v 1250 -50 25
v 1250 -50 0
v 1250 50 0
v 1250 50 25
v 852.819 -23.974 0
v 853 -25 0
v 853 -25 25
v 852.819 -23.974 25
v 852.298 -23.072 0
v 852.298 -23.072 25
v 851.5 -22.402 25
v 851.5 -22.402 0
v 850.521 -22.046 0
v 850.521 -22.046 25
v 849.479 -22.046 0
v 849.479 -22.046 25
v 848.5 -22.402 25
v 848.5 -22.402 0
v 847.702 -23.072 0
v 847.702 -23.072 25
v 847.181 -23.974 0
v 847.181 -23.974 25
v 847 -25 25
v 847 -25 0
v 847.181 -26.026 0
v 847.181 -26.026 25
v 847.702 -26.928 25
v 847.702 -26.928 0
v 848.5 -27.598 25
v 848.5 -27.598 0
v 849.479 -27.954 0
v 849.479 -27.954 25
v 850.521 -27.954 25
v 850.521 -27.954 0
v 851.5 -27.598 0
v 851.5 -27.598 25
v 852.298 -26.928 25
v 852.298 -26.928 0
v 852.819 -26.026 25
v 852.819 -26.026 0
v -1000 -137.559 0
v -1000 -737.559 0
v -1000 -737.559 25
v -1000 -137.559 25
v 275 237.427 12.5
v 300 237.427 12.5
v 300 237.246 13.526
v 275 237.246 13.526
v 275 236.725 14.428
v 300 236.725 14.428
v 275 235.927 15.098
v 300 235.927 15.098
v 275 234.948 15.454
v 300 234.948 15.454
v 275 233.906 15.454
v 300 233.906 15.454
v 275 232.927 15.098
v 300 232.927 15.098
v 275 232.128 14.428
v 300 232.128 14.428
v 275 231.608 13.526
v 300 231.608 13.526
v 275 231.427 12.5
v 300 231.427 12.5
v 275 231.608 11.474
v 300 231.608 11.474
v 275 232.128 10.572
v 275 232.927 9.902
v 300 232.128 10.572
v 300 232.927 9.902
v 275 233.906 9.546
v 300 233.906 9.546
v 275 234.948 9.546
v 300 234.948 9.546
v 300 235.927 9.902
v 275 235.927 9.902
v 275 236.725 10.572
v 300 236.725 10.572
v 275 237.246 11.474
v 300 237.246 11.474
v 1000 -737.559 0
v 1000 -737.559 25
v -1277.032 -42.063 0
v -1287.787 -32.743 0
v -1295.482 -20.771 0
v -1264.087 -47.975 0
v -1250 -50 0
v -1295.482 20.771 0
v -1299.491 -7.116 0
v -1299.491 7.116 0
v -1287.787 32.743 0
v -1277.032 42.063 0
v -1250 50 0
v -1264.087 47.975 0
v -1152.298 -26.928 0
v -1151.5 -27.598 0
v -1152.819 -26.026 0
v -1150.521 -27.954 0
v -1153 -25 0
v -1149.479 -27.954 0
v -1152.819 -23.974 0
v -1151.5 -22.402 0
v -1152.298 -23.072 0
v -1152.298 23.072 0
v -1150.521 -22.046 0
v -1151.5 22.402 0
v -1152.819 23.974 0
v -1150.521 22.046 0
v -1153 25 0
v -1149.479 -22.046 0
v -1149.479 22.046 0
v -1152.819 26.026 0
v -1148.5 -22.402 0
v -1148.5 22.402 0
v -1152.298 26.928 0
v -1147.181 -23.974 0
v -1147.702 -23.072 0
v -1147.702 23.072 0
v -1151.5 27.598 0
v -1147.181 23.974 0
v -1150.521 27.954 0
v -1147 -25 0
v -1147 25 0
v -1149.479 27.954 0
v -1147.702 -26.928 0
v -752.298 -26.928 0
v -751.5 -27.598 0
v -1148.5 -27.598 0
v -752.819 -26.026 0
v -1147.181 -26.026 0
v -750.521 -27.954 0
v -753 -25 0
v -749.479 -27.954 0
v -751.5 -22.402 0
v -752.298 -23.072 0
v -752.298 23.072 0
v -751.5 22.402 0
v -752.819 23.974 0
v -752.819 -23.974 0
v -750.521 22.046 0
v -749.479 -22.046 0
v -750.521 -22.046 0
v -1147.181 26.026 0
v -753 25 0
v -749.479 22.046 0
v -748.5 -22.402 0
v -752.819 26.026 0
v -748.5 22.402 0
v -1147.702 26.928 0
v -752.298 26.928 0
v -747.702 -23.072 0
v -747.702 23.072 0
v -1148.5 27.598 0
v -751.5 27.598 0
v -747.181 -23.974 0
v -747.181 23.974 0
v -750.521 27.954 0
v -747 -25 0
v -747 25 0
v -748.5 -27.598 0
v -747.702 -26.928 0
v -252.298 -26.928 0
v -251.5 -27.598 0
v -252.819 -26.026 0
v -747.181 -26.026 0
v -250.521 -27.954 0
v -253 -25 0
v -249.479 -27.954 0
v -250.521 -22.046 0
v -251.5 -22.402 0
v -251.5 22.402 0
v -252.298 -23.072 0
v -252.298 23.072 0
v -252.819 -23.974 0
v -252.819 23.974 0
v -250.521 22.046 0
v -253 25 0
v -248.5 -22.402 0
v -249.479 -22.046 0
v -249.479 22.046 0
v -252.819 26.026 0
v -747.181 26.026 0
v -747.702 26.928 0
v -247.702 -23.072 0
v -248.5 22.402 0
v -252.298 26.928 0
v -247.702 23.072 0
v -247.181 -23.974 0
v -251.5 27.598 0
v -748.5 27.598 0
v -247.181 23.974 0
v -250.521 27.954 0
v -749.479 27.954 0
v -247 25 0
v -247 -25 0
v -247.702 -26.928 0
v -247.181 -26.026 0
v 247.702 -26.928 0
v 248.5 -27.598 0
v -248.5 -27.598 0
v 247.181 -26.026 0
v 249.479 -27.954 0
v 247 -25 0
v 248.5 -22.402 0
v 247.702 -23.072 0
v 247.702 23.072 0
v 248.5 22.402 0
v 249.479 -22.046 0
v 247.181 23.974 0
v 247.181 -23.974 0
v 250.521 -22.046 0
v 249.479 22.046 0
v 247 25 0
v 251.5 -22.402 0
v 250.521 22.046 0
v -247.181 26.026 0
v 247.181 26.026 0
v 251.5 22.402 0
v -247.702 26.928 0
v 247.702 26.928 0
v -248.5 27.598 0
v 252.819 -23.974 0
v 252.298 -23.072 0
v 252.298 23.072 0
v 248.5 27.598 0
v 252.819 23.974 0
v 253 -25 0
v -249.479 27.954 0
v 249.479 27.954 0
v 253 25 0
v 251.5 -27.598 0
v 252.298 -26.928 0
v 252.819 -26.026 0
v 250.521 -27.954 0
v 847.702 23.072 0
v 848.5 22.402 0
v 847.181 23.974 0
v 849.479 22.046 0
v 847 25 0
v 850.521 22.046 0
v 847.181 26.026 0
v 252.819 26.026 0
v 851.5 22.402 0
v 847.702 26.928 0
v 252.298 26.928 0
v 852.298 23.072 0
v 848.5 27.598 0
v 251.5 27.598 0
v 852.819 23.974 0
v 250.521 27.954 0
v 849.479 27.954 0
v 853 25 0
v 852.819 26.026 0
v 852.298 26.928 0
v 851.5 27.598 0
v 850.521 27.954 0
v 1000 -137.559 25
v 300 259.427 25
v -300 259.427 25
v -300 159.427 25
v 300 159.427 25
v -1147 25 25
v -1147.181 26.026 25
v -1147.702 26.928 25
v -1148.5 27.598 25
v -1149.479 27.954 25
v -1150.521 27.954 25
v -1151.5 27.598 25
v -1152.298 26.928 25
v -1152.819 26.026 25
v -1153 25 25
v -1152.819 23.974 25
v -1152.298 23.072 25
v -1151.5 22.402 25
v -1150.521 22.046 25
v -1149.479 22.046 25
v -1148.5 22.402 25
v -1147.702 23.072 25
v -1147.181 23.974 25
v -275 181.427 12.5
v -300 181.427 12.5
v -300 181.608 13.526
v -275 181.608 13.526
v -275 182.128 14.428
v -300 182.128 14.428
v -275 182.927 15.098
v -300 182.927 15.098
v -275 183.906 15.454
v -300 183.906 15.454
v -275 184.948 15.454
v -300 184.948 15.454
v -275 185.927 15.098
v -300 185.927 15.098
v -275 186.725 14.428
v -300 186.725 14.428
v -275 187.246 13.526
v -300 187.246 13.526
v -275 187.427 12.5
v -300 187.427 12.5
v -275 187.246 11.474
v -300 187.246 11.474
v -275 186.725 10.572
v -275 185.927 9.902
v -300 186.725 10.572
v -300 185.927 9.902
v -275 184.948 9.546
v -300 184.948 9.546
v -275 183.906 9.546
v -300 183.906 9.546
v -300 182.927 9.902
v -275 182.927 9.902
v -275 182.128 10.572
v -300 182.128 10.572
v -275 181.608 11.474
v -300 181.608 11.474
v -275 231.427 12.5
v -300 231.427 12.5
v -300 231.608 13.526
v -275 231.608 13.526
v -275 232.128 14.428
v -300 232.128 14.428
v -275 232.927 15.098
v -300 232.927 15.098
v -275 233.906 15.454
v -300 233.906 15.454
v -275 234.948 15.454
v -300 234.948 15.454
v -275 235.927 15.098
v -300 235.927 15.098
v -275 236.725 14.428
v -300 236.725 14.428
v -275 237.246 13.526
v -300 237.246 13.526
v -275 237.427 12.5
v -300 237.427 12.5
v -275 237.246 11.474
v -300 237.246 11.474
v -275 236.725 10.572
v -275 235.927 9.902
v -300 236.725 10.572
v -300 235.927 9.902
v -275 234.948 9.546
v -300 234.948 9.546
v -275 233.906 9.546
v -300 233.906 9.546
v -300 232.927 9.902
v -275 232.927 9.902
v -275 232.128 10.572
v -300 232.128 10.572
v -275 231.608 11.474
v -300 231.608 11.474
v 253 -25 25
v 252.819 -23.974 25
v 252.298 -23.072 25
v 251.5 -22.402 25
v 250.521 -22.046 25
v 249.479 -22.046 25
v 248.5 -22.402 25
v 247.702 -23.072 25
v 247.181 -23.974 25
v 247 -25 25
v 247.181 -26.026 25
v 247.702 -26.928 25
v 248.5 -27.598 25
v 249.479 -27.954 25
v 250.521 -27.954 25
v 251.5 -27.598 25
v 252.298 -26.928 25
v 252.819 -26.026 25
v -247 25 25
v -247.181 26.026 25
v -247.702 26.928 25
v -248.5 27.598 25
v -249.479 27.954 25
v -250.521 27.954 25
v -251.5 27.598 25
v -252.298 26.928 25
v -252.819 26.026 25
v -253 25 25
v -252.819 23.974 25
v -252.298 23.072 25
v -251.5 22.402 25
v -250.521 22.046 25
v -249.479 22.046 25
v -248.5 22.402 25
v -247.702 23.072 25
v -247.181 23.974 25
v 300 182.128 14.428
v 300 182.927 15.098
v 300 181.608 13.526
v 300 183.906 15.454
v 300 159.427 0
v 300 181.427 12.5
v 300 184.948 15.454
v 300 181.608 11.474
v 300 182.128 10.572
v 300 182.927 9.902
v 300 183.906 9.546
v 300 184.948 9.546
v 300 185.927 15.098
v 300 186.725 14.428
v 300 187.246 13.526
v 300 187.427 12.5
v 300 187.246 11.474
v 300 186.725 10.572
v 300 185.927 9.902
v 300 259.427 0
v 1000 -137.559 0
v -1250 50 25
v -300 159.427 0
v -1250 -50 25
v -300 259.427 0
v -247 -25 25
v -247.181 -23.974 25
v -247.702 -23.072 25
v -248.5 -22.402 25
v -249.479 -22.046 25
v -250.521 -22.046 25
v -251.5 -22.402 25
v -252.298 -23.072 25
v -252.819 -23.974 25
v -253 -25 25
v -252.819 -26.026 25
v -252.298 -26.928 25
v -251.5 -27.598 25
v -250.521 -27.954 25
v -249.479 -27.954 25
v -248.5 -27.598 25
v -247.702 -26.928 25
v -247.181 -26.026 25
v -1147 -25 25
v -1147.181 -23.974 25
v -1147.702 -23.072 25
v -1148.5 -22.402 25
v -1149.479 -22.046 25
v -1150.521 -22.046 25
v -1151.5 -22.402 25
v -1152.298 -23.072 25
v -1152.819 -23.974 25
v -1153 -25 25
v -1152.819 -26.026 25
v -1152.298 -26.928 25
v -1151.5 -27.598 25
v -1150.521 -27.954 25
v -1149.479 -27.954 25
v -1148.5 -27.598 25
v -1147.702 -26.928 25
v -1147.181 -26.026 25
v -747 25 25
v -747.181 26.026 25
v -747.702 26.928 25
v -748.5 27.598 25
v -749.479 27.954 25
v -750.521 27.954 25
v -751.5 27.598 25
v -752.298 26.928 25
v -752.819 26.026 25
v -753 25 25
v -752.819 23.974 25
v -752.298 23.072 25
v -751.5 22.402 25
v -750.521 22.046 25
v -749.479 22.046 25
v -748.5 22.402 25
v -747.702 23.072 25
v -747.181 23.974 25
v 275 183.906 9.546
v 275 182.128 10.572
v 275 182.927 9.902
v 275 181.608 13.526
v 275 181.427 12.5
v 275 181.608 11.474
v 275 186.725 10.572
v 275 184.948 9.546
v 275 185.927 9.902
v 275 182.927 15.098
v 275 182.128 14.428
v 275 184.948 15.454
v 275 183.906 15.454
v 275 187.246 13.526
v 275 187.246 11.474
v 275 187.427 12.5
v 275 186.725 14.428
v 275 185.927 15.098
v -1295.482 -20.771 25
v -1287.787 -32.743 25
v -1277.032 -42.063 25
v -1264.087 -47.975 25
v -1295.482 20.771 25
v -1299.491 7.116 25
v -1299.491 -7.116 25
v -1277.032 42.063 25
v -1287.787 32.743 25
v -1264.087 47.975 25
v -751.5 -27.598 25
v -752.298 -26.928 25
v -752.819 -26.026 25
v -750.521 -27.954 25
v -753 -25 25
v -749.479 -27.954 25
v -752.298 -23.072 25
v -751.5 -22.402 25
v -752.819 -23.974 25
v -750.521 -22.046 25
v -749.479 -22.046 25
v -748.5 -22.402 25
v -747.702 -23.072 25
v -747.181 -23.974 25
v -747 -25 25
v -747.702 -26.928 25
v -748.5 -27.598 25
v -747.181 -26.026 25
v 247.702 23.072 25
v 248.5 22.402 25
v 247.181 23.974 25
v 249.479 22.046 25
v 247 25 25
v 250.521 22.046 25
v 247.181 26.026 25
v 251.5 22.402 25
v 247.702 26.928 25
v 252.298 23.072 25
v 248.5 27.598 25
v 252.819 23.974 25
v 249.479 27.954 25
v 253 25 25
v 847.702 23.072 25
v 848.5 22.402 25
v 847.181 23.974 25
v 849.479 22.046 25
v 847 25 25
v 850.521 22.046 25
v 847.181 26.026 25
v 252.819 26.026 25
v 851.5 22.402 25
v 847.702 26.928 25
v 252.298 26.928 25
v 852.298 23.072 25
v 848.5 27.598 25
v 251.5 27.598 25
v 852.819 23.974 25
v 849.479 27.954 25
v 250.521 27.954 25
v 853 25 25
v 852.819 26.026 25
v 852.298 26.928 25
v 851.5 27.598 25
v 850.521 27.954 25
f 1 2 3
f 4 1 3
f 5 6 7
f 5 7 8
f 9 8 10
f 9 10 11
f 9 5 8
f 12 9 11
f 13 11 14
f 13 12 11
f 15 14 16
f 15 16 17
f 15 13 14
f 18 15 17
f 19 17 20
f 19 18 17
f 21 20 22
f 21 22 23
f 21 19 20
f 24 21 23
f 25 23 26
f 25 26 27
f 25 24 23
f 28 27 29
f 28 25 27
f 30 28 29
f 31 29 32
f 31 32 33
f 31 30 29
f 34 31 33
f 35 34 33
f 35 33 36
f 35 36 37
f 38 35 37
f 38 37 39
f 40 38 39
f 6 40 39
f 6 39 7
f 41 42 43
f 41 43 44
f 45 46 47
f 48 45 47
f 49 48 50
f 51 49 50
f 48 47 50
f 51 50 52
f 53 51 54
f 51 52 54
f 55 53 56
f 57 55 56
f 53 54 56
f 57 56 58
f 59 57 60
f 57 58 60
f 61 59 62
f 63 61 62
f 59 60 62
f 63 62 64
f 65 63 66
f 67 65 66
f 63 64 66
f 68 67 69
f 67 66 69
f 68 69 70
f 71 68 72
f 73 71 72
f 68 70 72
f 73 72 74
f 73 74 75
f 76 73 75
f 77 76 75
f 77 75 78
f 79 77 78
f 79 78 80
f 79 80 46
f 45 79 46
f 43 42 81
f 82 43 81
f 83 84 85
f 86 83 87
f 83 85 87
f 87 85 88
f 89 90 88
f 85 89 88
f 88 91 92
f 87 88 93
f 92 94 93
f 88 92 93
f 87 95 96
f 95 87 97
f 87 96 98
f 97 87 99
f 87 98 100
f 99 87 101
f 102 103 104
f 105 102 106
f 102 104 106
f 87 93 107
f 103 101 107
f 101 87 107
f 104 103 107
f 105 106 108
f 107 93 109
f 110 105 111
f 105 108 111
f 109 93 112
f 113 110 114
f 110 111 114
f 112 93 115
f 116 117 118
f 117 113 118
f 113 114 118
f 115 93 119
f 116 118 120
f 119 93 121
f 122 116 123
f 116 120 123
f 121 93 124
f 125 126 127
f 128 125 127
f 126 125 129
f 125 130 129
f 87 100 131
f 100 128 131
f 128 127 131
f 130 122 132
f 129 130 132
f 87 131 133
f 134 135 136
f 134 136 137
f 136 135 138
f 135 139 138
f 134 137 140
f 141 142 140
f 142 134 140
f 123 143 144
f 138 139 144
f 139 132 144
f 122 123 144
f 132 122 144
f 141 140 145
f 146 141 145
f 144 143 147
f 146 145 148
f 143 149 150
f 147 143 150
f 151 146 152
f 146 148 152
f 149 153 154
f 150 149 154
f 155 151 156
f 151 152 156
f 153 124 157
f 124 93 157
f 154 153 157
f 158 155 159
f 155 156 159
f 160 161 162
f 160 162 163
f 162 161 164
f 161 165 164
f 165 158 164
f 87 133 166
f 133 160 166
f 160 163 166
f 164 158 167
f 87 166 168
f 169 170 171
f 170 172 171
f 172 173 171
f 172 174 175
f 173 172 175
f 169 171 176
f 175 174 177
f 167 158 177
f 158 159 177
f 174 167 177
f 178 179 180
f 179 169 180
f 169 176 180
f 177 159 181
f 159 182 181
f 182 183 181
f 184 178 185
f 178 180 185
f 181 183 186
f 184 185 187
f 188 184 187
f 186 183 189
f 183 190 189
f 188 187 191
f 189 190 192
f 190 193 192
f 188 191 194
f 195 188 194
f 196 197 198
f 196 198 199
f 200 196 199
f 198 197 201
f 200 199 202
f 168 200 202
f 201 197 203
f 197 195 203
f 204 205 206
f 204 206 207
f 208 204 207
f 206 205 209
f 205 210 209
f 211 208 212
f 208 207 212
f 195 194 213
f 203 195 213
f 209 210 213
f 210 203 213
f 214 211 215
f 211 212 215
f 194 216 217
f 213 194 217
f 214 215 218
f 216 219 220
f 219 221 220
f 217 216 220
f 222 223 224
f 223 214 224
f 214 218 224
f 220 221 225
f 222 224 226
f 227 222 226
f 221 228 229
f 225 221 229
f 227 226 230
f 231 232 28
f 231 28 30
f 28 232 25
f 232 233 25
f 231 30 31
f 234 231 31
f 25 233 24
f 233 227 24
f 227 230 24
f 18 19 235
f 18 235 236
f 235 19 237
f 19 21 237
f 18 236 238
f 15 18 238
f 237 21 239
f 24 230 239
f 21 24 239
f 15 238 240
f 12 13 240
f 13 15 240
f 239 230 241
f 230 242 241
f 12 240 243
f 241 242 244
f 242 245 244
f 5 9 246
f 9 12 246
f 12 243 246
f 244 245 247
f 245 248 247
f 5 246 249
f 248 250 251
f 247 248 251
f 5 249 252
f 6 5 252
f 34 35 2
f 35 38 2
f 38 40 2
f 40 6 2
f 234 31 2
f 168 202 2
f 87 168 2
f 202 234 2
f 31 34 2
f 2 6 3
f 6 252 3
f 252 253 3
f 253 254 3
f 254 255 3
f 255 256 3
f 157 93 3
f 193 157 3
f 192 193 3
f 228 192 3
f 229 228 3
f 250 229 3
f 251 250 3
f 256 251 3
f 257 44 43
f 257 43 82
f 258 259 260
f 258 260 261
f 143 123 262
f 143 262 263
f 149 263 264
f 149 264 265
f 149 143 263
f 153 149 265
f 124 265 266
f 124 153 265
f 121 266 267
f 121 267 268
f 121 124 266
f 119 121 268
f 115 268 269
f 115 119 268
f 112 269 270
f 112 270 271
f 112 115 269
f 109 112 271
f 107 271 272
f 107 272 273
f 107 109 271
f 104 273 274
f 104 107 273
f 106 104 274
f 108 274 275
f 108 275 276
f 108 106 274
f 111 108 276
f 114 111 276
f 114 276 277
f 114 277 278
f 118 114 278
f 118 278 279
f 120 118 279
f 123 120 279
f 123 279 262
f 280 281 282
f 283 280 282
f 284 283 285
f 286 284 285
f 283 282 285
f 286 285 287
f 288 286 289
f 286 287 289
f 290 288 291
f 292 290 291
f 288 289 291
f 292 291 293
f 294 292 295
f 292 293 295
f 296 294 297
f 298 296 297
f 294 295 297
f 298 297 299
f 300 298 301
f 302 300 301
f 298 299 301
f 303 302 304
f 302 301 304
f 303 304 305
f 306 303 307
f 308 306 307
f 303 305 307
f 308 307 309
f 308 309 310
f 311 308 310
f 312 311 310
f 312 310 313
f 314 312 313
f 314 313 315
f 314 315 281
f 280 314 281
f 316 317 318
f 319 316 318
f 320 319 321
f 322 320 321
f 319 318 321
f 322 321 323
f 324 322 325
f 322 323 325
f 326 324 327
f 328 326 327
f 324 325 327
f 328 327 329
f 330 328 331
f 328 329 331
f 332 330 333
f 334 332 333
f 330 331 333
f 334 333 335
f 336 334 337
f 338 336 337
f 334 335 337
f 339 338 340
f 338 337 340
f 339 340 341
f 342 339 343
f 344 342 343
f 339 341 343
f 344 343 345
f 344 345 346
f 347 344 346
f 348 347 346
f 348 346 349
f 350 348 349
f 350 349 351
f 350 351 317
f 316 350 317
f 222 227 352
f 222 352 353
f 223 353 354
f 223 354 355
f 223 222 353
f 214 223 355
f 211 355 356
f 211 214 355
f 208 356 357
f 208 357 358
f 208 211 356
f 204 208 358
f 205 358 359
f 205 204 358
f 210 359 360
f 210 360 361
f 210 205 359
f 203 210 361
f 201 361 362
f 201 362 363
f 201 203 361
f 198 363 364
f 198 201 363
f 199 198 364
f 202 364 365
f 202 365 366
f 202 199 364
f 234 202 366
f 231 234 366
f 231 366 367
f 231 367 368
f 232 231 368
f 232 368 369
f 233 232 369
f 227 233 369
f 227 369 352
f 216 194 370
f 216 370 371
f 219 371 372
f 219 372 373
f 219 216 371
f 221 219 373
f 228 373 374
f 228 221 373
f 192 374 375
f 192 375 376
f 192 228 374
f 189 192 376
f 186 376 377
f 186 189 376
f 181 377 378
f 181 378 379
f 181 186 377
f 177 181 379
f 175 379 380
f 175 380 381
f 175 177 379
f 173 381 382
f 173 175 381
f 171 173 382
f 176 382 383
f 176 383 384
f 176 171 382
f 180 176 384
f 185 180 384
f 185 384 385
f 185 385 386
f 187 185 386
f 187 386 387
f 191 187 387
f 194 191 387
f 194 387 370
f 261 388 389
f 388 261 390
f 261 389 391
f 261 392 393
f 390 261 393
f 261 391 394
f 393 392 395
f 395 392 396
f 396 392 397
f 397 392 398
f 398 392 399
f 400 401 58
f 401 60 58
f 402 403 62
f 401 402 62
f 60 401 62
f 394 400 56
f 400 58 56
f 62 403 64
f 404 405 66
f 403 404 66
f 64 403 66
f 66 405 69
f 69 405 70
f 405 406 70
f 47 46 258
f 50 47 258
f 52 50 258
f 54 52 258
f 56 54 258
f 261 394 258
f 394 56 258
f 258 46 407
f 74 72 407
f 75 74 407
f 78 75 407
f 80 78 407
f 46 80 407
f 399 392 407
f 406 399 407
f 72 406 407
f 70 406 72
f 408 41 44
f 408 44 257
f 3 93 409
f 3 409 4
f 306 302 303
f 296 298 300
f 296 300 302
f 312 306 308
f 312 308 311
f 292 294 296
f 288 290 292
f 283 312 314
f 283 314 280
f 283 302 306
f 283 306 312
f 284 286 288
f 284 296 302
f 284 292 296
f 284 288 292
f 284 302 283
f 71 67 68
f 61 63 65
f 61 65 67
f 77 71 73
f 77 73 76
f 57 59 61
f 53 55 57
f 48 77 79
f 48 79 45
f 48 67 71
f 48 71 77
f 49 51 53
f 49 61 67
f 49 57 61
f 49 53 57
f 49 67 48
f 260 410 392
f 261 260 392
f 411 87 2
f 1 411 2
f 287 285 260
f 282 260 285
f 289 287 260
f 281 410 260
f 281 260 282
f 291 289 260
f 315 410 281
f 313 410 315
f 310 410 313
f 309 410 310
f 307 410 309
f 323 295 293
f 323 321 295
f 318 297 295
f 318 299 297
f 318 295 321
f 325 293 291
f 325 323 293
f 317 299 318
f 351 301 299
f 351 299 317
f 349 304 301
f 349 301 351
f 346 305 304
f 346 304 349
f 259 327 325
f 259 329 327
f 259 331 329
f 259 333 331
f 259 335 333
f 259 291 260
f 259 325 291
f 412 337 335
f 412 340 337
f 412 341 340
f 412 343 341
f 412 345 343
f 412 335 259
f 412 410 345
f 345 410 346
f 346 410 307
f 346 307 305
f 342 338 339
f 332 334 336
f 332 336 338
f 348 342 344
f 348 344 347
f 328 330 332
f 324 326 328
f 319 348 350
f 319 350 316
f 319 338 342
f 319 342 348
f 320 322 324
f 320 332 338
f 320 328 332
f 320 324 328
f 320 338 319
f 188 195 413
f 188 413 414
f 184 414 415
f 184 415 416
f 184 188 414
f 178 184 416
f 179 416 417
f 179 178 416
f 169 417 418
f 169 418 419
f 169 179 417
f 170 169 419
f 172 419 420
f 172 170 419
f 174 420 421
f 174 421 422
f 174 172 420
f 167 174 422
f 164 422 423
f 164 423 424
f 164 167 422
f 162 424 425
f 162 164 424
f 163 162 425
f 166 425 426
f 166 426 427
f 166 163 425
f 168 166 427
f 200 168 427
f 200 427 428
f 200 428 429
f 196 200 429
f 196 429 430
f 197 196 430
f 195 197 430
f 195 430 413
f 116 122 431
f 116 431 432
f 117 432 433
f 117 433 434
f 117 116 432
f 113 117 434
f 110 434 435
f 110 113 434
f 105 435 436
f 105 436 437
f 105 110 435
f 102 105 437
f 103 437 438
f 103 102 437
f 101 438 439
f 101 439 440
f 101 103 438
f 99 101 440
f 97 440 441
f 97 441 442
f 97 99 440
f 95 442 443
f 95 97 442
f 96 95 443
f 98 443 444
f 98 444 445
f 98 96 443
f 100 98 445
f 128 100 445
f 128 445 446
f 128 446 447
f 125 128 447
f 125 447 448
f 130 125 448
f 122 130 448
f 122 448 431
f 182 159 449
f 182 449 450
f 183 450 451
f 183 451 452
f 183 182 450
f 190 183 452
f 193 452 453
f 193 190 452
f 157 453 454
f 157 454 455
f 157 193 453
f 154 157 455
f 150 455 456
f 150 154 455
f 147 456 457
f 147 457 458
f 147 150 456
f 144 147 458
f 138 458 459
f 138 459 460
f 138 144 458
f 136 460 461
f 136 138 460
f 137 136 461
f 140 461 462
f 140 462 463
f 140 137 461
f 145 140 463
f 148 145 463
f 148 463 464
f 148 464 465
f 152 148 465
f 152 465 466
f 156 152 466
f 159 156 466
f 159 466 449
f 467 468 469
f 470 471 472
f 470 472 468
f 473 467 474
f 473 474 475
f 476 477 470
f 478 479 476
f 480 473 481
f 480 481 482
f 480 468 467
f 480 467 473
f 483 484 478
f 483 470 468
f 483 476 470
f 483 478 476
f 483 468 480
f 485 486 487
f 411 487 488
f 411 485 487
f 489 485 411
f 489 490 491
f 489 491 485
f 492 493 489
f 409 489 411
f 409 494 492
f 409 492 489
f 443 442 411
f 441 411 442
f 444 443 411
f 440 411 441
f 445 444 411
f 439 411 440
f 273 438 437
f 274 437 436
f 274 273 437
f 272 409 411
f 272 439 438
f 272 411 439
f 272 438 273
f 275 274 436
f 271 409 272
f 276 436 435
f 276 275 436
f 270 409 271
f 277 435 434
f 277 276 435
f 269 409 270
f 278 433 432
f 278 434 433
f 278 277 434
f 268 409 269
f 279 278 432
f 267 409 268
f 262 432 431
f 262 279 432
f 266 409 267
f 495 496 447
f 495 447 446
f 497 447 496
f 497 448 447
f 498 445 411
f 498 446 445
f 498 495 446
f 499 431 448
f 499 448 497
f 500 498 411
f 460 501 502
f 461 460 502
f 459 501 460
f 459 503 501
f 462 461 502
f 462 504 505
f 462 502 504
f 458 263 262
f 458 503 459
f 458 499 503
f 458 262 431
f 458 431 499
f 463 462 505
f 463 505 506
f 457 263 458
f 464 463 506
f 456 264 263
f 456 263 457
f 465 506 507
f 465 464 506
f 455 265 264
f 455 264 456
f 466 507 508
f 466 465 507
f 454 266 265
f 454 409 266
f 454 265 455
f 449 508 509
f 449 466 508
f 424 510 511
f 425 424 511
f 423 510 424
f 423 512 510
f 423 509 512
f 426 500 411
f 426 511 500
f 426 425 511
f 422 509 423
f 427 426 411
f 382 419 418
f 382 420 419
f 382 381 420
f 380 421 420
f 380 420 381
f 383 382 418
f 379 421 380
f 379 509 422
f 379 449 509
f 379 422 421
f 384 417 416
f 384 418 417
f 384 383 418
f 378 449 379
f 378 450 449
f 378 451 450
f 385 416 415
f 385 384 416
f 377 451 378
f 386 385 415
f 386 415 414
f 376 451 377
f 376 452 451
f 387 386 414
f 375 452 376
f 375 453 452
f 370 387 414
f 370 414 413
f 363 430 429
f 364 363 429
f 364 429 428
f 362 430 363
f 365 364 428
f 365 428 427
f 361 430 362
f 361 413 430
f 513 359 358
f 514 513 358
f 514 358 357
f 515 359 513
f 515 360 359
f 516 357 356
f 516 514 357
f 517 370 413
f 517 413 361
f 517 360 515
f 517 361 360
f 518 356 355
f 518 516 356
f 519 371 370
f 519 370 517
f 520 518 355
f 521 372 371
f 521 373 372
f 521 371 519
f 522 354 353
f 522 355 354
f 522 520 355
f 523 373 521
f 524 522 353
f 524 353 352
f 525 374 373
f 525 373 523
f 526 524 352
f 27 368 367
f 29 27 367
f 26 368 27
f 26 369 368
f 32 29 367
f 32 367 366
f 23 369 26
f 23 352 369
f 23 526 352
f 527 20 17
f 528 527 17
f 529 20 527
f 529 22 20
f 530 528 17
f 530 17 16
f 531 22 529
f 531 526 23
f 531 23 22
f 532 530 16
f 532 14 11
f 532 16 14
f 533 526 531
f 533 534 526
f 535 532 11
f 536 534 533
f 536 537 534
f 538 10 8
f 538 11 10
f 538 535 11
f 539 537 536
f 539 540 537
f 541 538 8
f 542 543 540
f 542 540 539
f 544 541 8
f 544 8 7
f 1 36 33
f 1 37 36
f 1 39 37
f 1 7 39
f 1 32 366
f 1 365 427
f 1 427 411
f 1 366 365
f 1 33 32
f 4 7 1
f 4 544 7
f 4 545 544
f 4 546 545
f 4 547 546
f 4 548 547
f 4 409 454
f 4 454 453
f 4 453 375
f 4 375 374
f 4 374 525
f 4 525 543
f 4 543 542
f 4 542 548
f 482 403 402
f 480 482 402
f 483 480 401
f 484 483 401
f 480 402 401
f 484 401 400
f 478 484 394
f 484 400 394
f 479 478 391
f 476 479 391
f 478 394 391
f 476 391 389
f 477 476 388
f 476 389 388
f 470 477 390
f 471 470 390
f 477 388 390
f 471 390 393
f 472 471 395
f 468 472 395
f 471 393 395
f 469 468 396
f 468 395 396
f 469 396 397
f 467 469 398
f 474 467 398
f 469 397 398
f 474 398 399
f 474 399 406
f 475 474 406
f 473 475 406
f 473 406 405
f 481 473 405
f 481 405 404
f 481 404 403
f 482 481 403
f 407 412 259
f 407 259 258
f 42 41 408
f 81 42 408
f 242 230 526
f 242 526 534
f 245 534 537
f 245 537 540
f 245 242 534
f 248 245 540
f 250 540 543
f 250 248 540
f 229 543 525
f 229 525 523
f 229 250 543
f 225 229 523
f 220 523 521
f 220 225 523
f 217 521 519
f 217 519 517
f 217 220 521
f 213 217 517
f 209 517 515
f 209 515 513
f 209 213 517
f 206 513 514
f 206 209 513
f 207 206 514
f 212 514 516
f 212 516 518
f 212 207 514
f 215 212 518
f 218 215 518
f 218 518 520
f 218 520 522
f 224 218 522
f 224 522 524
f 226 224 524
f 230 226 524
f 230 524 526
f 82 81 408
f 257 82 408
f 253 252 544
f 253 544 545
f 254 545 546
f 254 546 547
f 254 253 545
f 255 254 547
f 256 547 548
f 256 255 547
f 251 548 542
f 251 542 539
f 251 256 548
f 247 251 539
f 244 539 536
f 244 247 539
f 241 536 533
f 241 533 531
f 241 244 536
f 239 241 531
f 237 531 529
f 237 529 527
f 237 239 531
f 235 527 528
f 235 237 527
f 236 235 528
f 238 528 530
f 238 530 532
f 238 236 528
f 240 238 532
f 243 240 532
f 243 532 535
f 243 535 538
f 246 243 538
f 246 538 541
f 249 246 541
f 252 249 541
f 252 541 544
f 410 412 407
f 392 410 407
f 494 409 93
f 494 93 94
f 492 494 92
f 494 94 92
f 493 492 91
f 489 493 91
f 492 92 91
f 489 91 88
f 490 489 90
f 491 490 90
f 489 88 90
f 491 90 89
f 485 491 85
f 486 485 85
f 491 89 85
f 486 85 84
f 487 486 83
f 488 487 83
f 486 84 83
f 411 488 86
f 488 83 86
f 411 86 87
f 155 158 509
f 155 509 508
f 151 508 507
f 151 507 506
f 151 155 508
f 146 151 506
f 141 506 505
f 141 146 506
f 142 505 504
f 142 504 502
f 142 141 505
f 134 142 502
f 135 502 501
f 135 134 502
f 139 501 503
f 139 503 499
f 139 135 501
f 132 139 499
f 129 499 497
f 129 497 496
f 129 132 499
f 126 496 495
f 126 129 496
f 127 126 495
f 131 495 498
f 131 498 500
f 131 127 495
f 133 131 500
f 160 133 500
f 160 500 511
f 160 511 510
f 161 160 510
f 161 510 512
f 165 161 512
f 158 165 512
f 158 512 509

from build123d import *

# Parameters (mm, degrees)
F0_W      = 2500
F0_H      = 100
F0_R      = 3
F1_DEPTH  = 25
F2_W      = 600
F2_H      = 100
F3_DEPTH  = 25
F5_R      = 3
F6_DEPTH  = 25
F7_R      = 3
F8_DEPTH  = 25
F9_W      = 2000
F9_H      = 600
F10_DEPTH = 25


with BuildPart() as f1:
    # F0 (on Top) → F1 (new body)
    with BuildSketch(Plane.XY):
        Rectangle(F0_W, F0_H)
        with Locations((-1150, -25)):
            Circle(F0_R, mode=Mode.SUBTRACT)
        with Locations((-750, -25)):
            Circle(F0_R, mode=Mode.SUBTRACT)
        with Locations((-250, -25)):
            Circle(F0_R, mode=Mode.SUBTRACT)
        with Locations((250, -25)):
            Circle(F0_R, mode=Mode.SUBTRACT)
        with Locations((850, -25)):
            Circle(F0_R, mode=Mode.SUBTRACT)
        with Locations((-1150, 25)):
            Circle(F0_R, mode=Mode.SUBTRACT)
        with Locations((-750, 25)):
            Circle(F0_R, mode=Mode.SUBTRACT)
        with Locations((-250, 25)):
            Circle(F0_R, mode=Mode.SUBTRACT)
        with Locations((250, 25)):
            Circle(F0_R, mode=Mode.SUBTRACT)
        with Locations((850, 25)):
            Circle(F0_R, mode=Mode.SUBTRACT)
        with BuildLine():
            ThreePointArc((-1250, 50), (-1300, 0), (-1250, -50))
            Line((-1250, -50), (-1250, 50))
        make_face()
    extrude(amount=F1_DEPTH)


with BuildPart() as f3:
    # F2 (on Top) → F3 (new body)
    with BuildSketch(Plane.XY):
        with Locations((0, 209.42659)):
            Rectangle(F2_W, F2_H)
    extrude(amount=F3_DEPTH)

    # F5 (on face) → F6 (cut)
    with BuildSketch(Plane(origin=(-300, 0, 0), x_dir=(0, -1, 0), z_dir=(-1, 0, 0))):
        with Locations((-234.42659, 12.5)):
            Circle(F5_R)
        with Locations((-184.42659, 12.5)):
            Circle(F5_R)
    extrude(amount=-F6_DEPTH, mode=Mode.SUBTRACT)

    # F7 (on face) → F8 (cut)
    with BuildSketch(Plane.YZ.offset(300)):
        with Locations((184.42659, 12.5)):
            Circle(F7_R)
        with Locations((234.42659, 12.5)):
            Circle(F7_R)
    extrude(amount=-F8_DEPTH, mode=Mode.SUBTRACT)


with BuildPart() as f10:
    # F9 (on Top) → F10 (new body)
    with BuildSketch(Plane.XY):
        with Locations((0, -437.558951)):
            Rectangle(F9_W, F9_H)
    extrude(amount=F10_DEPTH)


solid = Compound([f1.part, f3.part, f10.part])
